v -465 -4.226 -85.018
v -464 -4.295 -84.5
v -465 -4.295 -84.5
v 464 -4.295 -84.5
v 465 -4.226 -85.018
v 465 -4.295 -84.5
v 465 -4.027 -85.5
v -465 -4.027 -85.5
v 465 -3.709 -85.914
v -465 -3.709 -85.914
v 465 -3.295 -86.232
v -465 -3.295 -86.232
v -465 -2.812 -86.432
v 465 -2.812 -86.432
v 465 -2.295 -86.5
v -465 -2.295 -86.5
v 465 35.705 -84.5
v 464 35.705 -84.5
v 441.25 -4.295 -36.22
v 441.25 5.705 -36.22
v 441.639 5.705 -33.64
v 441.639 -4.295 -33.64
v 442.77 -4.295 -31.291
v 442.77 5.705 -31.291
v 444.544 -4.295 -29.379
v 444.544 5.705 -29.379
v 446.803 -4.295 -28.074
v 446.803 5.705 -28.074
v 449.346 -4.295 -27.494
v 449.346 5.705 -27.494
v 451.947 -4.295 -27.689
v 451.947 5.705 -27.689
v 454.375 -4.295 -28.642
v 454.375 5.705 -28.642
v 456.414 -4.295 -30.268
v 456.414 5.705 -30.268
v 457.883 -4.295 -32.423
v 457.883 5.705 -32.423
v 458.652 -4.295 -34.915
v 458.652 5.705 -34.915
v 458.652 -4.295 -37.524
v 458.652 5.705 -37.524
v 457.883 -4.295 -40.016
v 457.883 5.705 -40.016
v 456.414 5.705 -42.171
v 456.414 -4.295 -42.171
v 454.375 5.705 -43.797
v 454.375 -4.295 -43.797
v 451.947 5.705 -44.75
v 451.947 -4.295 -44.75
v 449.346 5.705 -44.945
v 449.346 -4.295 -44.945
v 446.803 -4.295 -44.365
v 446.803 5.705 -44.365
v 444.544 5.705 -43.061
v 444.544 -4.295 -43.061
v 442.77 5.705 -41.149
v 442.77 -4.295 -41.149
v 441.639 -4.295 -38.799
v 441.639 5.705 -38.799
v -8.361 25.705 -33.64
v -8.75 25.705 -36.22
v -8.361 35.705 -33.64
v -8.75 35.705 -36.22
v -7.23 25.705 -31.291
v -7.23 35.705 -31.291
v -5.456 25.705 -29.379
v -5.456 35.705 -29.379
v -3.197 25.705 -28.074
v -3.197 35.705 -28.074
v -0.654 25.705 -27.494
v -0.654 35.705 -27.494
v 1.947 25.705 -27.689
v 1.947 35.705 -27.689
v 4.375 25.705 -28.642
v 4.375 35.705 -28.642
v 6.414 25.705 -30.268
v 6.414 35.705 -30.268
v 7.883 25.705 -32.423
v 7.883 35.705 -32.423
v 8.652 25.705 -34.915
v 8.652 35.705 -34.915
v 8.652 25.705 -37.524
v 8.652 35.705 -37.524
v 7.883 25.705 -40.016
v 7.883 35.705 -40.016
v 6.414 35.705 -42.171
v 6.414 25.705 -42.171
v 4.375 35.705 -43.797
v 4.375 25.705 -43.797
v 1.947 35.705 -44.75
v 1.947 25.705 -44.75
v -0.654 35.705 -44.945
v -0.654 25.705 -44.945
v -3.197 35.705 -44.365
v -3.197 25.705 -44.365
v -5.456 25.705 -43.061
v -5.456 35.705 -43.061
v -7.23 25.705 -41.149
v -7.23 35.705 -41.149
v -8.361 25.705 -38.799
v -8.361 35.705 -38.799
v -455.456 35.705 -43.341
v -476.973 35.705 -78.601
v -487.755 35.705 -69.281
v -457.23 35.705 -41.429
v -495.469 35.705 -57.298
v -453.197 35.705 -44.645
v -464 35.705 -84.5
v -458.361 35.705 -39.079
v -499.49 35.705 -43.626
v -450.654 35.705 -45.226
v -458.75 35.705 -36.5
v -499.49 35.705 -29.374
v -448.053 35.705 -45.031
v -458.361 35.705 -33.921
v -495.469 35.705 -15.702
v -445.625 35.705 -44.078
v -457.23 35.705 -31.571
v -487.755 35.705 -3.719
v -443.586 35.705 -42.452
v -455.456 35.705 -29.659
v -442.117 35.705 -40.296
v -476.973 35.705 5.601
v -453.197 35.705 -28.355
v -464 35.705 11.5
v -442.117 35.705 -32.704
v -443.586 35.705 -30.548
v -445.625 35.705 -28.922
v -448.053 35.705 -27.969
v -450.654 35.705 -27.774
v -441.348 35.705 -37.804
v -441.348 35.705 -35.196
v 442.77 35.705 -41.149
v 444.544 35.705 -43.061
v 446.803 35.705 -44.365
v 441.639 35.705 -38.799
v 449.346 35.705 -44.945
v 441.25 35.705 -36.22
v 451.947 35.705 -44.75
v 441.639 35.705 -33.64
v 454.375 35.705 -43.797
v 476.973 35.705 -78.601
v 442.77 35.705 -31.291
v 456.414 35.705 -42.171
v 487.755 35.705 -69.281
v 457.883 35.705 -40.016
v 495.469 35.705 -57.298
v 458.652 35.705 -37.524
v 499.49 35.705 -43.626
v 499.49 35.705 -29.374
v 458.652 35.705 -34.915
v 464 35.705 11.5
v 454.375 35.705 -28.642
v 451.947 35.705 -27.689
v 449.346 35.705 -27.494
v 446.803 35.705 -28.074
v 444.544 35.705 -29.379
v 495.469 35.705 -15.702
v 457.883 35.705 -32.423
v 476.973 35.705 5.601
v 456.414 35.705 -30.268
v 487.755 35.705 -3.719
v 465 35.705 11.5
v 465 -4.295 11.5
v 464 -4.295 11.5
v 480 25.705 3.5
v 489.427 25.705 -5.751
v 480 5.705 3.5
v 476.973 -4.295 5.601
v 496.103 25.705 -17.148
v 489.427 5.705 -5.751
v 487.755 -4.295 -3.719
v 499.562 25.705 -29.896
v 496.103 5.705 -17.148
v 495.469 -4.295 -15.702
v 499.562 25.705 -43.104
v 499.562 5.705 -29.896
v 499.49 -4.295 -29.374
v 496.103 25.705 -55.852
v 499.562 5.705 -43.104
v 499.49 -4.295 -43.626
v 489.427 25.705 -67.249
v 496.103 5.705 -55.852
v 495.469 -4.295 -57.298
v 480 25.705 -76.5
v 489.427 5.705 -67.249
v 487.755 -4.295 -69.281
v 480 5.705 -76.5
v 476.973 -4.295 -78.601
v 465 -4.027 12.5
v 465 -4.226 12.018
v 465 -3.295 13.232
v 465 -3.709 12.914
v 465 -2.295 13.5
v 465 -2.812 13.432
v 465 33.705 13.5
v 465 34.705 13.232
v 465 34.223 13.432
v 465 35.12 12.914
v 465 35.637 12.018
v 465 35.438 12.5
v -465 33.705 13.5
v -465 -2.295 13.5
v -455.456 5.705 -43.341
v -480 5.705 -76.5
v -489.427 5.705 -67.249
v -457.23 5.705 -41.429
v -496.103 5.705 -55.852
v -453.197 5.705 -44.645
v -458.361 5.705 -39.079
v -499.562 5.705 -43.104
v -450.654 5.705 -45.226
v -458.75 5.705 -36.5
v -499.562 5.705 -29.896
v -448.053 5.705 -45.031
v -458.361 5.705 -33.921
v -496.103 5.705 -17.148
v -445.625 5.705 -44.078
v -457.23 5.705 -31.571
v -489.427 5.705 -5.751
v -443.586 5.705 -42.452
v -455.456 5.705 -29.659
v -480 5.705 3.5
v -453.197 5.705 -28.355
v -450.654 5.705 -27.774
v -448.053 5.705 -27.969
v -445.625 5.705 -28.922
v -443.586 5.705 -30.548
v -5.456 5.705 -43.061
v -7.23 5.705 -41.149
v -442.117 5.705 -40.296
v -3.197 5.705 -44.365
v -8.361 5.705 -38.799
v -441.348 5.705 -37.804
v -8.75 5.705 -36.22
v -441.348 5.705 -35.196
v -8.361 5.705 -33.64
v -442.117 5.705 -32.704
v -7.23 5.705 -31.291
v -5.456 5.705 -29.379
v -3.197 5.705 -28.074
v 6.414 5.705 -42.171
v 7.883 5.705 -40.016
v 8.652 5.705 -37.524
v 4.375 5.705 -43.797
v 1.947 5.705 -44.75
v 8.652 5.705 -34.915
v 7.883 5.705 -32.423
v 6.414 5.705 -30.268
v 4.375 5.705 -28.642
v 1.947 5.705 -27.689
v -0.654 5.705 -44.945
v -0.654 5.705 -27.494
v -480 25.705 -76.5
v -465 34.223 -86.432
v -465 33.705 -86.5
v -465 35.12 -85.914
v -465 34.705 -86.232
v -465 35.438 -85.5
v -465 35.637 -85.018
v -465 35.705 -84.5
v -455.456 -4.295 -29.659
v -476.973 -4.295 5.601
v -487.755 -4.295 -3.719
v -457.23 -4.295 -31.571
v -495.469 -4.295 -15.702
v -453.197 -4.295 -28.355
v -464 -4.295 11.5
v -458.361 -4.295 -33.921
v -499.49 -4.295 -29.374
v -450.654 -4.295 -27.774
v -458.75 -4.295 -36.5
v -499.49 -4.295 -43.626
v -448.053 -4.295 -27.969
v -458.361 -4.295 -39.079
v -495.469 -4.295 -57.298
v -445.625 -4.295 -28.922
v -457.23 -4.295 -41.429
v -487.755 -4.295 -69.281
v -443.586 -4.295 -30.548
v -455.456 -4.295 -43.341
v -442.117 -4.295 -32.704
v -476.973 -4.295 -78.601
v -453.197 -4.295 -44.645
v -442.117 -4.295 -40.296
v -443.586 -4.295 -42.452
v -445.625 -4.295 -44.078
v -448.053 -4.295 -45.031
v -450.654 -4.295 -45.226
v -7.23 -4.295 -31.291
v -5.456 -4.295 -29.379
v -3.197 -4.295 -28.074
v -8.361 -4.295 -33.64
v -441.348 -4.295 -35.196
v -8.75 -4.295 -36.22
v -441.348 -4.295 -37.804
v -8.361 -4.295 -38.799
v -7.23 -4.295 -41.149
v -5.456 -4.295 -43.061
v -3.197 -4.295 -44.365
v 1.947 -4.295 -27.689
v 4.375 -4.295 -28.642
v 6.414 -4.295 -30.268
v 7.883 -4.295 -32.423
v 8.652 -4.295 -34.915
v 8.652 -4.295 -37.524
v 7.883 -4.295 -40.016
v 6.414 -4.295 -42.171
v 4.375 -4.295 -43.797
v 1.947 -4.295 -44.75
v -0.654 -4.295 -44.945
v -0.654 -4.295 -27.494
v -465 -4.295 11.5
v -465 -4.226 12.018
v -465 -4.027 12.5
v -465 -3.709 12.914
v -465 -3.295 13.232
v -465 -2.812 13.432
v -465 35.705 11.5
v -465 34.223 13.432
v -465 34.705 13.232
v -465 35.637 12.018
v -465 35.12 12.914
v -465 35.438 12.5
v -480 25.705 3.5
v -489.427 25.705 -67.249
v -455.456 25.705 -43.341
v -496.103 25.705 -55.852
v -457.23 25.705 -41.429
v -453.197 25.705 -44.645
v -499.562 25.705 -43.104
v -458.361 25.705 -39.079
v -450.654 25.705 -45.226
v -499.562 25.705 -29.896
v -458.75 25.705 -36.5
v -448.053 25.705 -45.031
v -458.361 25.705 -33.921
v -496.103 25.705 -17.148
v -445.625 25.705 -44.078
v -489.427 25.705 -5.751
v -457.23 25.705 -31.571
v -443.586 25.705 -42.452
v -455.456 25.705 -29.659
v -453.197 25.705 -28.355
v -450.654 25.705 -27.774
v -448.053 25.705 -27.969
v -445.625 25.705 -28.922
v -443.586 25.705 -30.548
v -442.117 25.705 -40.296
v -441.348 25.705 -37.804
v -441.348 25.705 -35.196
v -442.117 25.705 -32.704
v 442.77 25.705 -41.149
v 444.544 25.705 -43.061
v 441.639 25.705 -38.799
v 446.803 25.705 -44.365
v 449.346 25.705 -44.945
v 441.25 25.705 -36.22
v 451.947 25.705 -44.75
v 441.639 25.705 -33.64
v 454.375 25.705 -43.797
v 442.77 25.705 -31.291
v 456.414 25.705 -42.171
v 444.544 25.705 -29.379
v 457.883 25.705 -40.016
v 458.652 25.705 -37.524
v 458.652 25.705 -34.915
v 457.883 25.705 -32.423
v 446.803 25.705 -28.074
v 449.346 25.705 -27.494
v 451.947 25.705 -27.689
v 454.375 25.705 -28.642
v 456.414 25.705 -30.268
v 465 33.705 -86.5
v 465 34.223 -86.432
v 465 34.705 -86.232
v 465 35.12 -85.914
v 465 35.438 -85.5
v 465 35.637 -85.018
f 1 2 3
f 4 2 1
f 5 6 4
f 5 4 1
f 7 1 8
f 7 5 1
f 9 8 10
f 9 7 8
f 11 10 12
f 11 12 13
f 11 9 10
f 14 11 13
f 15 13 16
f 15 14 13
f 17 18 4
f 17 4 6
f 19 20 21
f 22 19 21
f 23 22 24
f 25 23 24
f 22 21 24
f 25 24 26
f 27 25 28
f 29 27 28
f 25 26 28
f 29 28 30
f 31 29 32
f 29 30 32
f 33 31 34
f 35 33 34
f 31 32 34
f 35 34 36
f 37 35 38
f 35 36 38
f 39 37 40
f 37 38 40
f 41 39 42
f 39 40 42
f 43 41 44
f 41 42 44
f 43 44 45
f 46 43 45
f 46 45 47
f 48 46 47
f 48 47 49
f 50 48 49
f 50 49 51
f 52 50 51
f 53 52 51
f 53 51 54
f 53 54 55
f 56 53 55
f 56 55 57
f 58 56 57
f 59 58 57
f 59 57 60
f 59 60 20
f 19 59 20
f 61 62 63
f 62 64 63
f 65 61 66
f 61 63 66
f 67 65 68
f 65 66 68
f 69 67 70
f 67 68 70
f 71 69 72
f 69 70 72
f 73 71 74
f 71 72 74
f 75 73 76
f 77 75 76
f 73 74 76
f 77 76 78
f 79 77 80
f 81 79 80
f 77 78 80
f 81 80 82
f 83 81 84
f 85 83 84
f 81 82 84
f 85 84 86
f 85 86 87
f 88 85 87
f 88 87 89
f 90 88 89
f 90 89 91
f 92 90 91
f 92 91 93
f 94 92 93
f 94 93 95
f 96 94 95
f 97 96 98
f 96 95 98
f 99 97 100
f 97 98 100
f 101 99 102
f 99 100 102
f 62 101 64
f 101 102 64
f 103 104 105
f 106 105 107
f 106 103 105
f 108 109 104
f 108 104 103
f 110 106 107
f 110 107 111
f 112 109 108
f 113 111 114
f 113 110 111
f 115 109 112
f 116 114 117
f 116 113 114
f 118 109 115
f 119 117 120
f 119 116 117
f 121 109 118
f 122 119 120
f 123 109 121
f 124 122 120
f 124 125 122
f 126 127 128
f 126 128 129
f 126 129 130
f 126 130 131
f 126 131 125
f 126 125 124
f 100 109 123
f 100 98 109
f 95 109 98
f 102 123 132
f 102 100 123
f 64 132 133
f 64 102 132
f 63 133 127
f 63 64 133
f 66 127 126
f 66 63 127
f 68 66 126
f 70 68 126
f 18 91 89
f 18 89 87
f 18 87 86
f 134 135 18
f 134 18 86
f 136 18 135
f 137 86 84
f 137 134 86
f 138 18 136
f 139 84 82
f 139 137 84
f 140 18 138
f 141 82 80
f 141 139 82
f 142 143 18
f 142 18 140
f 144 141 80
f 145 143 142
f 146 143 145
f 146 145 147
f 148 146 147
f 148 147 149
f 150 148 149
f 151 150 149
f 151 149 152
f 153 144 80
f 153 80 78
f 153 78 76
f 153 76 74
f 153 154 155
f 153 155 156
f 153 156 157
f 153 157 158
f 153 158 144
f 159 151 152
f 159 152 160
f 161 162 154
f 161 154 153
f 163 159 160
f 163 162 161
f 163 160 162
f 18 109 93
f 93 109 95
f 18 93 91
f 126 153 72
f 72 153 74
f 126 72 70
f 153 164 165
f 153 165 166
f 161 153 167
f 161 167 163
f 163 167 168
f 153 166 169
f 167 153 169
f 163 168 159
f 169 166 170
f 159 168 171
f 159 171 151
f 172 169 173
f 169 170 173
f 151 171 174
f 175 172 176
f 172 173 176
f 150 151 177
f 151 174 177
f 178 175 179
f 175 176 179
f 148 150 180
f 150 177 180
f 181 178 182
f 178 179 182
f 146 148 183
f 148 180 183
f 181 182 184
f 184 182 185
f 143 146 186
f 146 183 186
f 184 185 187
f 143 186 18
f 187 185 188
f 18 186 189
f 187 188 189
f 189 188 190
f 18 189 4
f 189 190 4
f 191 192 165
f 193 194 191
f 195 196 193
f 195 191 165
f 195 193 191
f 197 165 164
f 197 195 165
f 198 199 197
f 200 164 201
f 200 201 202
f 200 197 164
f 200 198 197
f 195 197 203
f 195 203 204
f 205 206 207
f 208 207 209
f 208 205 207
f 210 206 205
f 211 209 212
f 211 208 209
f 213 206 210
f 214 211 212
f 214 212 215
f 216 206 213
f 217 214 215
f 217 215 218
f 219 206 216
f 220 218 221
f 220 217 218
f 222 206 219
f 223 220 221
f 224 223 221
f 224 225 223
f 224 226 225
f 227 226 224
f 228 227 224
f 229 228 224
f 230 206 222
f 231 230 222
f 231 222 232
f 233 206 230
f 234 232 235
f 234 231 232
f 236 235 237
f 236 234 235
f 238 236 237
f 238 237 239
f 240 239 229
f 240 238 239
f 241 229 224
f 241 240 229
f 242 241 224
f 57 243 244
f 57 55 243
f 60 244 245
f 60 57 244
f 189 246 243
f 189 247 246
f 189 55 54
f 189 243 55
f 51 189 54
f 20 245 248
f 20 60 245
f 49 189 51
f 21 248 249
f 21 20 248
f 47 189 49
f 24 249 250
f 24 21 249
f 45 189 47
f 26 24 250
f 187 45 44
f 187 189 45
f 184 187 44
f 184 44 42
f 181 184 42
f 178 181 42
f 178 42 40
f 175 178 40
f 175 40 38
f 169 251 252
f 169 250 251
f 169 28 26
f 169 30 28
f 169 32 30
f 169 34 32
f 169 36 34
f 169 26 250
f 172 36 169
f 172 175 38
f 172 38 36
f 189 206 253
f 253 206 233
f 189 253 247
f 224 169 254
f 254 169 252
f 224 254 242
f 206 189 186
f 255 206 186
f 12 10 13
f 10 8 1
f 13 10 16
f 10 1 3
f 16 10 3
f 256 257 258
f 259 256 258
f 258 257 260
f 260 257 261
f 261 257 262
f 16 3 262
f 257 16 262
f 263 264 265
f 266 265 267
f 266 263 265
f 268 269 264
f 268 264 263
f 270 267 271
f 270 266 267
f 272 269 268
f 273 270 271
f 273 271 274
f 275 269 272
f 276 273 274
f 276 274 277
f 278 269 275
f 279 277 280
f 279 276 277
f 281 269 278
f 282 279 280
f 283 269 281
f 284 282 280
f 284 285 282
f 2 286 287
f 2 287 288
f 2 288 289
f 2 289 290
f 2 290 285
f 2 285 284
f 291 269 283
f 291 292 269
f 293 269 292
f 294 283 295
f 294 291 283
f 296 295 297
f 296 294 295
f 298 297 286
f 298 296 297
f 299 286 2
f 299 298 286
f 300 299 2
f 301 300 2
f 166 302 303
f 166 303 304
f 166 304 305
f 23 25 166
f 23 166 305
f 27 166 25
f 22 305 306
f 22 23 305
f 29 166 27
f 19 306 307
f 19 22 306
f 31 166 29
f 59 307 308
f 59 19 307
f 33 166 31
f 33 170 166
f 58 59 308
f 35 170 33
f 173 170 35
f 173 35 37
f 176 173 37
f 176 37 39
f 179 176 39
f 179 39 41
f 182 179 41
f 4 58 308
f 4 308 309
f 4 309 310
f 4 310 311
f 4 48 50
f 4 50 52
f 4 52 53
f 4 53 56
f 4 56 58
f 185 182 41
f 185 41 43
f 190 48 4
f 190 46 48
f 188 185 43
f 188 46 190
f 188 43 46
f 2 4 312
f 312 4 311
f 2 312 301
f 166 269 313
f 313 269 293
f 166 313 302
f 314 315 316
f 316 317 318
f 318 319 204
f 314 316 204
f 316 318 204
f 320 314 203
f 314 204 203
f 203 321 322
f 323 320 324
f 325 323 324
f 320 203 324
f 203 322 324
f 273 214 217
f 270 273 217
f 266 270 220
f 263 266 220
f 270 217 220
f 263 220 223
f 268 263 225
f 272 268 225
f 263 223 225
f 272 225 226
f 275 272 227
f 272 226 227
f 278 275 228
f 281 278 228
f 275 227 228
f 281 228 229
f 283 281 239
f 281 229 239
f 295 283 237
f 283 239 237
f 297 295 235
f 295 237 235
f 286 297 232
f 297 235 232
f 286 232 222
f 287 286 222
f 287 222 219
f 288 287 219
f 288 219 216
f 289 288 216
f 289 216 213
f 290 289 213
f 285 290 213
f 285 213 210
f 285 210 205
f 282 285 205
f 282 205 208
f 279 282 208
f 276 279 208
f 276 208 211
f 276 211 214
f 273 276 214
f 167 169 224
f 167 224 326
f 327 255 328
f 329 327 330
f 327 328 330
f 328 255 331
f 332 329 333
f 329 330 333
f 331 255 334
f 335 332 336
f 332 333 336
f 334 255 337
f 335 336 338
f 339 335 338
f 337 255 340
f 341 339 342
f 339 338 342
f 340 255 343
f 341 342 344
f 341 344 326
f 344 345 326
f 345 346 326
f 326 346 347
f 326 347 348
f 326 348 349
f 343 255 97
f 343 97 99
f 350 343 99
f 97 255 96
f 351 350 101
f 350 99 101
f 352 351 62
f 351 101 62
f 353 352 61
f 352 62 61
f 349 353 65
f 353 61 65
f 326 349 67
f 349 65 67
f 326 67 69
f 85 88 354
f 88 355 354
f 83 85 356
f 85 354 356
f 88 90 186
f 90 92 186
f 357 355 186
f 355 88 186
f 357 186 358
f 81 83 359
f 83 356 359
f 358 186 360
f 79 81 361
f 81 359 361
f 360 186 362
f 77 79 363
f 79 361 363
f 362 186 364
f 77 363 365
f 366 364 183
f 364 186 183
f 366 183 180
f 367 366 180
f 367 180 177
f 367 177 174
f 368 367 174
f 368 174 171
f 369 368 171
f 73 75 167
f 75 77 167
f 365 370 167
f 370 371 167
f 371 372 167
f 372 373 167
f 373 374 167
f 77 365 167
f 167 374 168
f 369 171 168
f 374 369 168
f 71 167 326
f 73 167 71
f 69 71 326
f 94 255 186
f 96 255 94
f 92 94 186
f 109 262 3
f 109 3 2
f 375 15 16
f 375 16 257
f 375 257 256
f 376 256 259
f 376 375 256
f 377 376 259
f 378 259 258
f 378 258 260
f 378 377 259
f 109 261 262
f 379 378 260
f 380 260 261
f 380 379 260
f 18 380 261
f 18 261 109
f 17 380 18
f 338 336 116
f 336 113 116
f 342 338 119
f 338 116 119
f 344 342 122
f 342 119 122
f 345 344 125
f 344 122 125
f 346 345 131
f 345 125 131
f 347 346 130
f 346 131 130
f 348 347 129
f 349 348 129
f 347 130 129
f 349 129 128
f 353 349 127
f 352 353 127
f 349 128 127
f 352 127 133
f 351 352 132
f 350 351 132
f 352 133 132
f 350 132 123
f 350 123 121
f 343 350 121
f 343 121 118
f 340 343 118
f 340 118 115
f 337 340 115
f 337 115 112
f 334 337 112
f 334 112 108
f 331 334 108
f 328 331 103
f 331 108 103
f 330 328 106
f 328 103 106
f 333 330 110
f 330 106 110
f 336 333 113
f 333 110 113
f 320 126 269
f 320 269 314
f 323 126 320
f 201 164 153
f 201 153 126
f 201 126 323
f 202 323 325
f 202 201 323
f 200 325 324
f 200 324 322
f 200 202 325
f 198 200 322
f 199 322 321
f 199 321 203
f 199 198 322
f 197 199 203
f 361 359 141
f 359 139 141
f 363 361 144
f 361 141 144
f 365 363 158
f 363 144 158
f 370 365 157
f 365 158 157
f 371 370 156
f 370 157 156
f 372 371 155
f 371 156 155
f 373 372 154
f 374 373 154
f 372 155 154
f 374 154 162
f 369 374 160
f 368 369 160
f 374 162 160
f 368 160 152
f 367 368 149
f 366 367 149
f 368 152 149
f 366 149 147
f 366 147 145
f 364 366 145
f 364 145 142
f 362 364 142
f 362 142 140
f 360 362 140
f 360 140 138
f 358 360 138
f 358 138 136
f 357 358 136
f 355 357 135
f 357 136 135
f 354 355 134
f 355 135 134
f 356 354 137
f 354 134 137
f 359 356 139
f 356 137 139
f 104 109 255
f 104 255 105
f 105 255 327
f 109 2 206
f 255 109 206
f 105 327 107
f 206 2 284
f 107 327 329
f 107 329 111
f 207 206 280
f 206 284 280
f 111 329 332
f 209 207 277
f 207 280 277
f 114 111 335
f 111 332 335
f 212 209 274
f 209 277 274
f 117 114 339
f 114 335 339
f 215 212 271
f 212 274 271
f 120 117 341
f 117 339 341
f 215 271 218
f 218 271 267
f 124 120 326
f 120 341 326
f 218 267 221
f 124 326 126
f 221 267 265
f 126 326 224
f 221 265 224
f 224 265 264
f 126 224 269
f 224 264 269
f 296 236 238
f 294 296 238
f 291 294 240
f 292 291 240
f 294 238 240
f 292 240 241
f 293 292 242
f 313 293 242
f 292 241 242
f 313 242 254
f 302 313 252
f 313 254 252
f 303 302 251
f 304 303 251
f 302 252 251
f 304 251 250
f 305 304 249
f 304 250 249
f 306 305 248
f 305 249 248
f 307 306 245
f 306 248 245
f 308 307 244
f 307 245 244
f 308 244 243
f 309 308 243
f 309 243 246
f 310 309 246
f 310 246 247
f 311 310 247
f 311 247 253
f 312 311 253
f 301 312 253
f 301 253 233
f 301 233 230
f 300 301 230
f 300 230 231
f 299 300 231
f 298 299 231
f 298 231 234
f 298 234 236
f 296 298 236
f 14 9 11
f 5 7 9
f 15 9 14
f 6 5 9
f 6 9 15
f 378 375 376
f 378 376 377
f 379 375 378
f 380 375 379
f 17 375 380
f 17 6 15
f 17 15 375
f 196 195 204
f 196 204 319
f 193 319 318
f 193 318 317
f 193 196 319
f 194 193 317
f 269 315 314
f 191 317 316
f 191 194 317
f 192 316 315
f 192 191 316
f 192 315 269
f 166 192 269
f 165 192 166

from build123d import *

# Parameters (mm, degrees)
F3_W     = 20
F3_H     = 80
F4_DEPTH = 500
F6_D     = 17.5
F6_DEPTH = 40
F6_TIP   = 5.2575304165
F7_DEPTH = 40
F8_DEPTH = 35
F9_DEPTH = 35


# Not quite as in the source:
# - a feature names something its author has since deleted; it is built from what else it names


with BuildPart() as f4:
    # F3 (on Right) → F4 (new body, symmetric)
    with BuildSketch(Plane.YZ):
        with BuildLine():
            ThreePointArc((-4.2945303673, -84.5), (-3.7087439297, -85.9142135624), (-2.2945303673, -86.5))
            Line((-2.2945303673, -86.5), (33.7054696327, -86.5))
            ThreePointArc((33.7054696327, -86.5), (35.1196831951, -85.9142135624), (35.7054696327, -84.5))
            Line((35.7054696327, -84.5), (35.7054696327, 11.5))
            ThreePointArc((35.7054696327, 11.5), (35.1196831951, 12.9142135624), (33.7054696327, 13.5))
            Line((33.7054696327, 13.5), (-2.2945303673, 13.5))
            ThreePointArc((-2.2945303673, 13.5), (-3.7087439297, 12.9142135624), (-4.2945303673, 11.5))
            Line((-4.2945303673, 11.5), (-4.2945303673, -84.5))
        make_face()
        with Locations((15.7054696327, -36.5)):
            Rectangle(F3_W, F3_H, mode=Mode.SUBTRACT)
    extrude(amount=F4_DEPTH, both=True)

    # F6
    with Locations(Plane.XZ.offset(4.2945303673)):
        with Locations((450, -36.2195856869), (0, -36.2195856869), (-450, -36.5)):
            Hole(F6_D / 2, depth=F6_DEPTH)
            with Locations((0, 0, -(F6_DEPTH + F6_TIP / 2))):  # 118° drill point
                Cone(0, F6_D / 2, F6_TIP, mode=Mode.SUBTRACT)

    # F5 (on face) → F7 (cut)
    with BuildSketch(Plane.XZ.offset(4.2945303673)):
        with BuildLine():
            ThreePointArc((-500, -36.5), (-490, -6.5), (-464, 11.5))
            Line((-464, 11.5), (-500, 11.5))
            Line((-500, 11.5), (-500, -36.5))
        make_face()
        with BuildLine():
            ThreePointArc((-464, -84.5), (-490, -66.5), (-500, -36.5))
            Line((-500, -36.5), (-500, -84.5))
            Line((-500, -84.5), (-464, -84.5))
        make_face()
        with BuildLine():
            Line((500, 11.5), (464, 11.5))
            ThreePointArc((464, 11.5), (490, -6.5), (500, -36.5))
            Line((500, -36.5), (500, 11.5))
        make_face()
        with BuildLine():
            Line((500, -84.5), (500, -36.5))
            ThreePointArc((500, -36.5), (490, -66.5), (464, -84.5))
            Line((464, -84.5), (500, -84.5))
        make_face()
    extrude(amount=-F7_DEPTH, mode=Mode.SUBTRACT)

    # F8 (cut): faces of the model
    f8_faces = [f4.faces().sort_by_distance(p)[0] for p in [
        (-500, 15.7054696327, 12.4878664624),
        (-500, 15.7054696327, -85.4878664624),
    ]]
    extrude(f8_faces, amount=-F8_DEPTH, mode=Mode.SUBTRACT)

    # F9 (cut): faces of the model
    f9_faces = [f4.faces().sort_by_distance(p)[0] for p in [
        (500, 15.7054696327, -85.4878664624),
        (500, 15.7054696327, 12.4878664624),
    ]]
    extrude(f9_faces, amount=-F9_DEPTH, mode=Mode.SUBTRACT)


solid = f4.part
